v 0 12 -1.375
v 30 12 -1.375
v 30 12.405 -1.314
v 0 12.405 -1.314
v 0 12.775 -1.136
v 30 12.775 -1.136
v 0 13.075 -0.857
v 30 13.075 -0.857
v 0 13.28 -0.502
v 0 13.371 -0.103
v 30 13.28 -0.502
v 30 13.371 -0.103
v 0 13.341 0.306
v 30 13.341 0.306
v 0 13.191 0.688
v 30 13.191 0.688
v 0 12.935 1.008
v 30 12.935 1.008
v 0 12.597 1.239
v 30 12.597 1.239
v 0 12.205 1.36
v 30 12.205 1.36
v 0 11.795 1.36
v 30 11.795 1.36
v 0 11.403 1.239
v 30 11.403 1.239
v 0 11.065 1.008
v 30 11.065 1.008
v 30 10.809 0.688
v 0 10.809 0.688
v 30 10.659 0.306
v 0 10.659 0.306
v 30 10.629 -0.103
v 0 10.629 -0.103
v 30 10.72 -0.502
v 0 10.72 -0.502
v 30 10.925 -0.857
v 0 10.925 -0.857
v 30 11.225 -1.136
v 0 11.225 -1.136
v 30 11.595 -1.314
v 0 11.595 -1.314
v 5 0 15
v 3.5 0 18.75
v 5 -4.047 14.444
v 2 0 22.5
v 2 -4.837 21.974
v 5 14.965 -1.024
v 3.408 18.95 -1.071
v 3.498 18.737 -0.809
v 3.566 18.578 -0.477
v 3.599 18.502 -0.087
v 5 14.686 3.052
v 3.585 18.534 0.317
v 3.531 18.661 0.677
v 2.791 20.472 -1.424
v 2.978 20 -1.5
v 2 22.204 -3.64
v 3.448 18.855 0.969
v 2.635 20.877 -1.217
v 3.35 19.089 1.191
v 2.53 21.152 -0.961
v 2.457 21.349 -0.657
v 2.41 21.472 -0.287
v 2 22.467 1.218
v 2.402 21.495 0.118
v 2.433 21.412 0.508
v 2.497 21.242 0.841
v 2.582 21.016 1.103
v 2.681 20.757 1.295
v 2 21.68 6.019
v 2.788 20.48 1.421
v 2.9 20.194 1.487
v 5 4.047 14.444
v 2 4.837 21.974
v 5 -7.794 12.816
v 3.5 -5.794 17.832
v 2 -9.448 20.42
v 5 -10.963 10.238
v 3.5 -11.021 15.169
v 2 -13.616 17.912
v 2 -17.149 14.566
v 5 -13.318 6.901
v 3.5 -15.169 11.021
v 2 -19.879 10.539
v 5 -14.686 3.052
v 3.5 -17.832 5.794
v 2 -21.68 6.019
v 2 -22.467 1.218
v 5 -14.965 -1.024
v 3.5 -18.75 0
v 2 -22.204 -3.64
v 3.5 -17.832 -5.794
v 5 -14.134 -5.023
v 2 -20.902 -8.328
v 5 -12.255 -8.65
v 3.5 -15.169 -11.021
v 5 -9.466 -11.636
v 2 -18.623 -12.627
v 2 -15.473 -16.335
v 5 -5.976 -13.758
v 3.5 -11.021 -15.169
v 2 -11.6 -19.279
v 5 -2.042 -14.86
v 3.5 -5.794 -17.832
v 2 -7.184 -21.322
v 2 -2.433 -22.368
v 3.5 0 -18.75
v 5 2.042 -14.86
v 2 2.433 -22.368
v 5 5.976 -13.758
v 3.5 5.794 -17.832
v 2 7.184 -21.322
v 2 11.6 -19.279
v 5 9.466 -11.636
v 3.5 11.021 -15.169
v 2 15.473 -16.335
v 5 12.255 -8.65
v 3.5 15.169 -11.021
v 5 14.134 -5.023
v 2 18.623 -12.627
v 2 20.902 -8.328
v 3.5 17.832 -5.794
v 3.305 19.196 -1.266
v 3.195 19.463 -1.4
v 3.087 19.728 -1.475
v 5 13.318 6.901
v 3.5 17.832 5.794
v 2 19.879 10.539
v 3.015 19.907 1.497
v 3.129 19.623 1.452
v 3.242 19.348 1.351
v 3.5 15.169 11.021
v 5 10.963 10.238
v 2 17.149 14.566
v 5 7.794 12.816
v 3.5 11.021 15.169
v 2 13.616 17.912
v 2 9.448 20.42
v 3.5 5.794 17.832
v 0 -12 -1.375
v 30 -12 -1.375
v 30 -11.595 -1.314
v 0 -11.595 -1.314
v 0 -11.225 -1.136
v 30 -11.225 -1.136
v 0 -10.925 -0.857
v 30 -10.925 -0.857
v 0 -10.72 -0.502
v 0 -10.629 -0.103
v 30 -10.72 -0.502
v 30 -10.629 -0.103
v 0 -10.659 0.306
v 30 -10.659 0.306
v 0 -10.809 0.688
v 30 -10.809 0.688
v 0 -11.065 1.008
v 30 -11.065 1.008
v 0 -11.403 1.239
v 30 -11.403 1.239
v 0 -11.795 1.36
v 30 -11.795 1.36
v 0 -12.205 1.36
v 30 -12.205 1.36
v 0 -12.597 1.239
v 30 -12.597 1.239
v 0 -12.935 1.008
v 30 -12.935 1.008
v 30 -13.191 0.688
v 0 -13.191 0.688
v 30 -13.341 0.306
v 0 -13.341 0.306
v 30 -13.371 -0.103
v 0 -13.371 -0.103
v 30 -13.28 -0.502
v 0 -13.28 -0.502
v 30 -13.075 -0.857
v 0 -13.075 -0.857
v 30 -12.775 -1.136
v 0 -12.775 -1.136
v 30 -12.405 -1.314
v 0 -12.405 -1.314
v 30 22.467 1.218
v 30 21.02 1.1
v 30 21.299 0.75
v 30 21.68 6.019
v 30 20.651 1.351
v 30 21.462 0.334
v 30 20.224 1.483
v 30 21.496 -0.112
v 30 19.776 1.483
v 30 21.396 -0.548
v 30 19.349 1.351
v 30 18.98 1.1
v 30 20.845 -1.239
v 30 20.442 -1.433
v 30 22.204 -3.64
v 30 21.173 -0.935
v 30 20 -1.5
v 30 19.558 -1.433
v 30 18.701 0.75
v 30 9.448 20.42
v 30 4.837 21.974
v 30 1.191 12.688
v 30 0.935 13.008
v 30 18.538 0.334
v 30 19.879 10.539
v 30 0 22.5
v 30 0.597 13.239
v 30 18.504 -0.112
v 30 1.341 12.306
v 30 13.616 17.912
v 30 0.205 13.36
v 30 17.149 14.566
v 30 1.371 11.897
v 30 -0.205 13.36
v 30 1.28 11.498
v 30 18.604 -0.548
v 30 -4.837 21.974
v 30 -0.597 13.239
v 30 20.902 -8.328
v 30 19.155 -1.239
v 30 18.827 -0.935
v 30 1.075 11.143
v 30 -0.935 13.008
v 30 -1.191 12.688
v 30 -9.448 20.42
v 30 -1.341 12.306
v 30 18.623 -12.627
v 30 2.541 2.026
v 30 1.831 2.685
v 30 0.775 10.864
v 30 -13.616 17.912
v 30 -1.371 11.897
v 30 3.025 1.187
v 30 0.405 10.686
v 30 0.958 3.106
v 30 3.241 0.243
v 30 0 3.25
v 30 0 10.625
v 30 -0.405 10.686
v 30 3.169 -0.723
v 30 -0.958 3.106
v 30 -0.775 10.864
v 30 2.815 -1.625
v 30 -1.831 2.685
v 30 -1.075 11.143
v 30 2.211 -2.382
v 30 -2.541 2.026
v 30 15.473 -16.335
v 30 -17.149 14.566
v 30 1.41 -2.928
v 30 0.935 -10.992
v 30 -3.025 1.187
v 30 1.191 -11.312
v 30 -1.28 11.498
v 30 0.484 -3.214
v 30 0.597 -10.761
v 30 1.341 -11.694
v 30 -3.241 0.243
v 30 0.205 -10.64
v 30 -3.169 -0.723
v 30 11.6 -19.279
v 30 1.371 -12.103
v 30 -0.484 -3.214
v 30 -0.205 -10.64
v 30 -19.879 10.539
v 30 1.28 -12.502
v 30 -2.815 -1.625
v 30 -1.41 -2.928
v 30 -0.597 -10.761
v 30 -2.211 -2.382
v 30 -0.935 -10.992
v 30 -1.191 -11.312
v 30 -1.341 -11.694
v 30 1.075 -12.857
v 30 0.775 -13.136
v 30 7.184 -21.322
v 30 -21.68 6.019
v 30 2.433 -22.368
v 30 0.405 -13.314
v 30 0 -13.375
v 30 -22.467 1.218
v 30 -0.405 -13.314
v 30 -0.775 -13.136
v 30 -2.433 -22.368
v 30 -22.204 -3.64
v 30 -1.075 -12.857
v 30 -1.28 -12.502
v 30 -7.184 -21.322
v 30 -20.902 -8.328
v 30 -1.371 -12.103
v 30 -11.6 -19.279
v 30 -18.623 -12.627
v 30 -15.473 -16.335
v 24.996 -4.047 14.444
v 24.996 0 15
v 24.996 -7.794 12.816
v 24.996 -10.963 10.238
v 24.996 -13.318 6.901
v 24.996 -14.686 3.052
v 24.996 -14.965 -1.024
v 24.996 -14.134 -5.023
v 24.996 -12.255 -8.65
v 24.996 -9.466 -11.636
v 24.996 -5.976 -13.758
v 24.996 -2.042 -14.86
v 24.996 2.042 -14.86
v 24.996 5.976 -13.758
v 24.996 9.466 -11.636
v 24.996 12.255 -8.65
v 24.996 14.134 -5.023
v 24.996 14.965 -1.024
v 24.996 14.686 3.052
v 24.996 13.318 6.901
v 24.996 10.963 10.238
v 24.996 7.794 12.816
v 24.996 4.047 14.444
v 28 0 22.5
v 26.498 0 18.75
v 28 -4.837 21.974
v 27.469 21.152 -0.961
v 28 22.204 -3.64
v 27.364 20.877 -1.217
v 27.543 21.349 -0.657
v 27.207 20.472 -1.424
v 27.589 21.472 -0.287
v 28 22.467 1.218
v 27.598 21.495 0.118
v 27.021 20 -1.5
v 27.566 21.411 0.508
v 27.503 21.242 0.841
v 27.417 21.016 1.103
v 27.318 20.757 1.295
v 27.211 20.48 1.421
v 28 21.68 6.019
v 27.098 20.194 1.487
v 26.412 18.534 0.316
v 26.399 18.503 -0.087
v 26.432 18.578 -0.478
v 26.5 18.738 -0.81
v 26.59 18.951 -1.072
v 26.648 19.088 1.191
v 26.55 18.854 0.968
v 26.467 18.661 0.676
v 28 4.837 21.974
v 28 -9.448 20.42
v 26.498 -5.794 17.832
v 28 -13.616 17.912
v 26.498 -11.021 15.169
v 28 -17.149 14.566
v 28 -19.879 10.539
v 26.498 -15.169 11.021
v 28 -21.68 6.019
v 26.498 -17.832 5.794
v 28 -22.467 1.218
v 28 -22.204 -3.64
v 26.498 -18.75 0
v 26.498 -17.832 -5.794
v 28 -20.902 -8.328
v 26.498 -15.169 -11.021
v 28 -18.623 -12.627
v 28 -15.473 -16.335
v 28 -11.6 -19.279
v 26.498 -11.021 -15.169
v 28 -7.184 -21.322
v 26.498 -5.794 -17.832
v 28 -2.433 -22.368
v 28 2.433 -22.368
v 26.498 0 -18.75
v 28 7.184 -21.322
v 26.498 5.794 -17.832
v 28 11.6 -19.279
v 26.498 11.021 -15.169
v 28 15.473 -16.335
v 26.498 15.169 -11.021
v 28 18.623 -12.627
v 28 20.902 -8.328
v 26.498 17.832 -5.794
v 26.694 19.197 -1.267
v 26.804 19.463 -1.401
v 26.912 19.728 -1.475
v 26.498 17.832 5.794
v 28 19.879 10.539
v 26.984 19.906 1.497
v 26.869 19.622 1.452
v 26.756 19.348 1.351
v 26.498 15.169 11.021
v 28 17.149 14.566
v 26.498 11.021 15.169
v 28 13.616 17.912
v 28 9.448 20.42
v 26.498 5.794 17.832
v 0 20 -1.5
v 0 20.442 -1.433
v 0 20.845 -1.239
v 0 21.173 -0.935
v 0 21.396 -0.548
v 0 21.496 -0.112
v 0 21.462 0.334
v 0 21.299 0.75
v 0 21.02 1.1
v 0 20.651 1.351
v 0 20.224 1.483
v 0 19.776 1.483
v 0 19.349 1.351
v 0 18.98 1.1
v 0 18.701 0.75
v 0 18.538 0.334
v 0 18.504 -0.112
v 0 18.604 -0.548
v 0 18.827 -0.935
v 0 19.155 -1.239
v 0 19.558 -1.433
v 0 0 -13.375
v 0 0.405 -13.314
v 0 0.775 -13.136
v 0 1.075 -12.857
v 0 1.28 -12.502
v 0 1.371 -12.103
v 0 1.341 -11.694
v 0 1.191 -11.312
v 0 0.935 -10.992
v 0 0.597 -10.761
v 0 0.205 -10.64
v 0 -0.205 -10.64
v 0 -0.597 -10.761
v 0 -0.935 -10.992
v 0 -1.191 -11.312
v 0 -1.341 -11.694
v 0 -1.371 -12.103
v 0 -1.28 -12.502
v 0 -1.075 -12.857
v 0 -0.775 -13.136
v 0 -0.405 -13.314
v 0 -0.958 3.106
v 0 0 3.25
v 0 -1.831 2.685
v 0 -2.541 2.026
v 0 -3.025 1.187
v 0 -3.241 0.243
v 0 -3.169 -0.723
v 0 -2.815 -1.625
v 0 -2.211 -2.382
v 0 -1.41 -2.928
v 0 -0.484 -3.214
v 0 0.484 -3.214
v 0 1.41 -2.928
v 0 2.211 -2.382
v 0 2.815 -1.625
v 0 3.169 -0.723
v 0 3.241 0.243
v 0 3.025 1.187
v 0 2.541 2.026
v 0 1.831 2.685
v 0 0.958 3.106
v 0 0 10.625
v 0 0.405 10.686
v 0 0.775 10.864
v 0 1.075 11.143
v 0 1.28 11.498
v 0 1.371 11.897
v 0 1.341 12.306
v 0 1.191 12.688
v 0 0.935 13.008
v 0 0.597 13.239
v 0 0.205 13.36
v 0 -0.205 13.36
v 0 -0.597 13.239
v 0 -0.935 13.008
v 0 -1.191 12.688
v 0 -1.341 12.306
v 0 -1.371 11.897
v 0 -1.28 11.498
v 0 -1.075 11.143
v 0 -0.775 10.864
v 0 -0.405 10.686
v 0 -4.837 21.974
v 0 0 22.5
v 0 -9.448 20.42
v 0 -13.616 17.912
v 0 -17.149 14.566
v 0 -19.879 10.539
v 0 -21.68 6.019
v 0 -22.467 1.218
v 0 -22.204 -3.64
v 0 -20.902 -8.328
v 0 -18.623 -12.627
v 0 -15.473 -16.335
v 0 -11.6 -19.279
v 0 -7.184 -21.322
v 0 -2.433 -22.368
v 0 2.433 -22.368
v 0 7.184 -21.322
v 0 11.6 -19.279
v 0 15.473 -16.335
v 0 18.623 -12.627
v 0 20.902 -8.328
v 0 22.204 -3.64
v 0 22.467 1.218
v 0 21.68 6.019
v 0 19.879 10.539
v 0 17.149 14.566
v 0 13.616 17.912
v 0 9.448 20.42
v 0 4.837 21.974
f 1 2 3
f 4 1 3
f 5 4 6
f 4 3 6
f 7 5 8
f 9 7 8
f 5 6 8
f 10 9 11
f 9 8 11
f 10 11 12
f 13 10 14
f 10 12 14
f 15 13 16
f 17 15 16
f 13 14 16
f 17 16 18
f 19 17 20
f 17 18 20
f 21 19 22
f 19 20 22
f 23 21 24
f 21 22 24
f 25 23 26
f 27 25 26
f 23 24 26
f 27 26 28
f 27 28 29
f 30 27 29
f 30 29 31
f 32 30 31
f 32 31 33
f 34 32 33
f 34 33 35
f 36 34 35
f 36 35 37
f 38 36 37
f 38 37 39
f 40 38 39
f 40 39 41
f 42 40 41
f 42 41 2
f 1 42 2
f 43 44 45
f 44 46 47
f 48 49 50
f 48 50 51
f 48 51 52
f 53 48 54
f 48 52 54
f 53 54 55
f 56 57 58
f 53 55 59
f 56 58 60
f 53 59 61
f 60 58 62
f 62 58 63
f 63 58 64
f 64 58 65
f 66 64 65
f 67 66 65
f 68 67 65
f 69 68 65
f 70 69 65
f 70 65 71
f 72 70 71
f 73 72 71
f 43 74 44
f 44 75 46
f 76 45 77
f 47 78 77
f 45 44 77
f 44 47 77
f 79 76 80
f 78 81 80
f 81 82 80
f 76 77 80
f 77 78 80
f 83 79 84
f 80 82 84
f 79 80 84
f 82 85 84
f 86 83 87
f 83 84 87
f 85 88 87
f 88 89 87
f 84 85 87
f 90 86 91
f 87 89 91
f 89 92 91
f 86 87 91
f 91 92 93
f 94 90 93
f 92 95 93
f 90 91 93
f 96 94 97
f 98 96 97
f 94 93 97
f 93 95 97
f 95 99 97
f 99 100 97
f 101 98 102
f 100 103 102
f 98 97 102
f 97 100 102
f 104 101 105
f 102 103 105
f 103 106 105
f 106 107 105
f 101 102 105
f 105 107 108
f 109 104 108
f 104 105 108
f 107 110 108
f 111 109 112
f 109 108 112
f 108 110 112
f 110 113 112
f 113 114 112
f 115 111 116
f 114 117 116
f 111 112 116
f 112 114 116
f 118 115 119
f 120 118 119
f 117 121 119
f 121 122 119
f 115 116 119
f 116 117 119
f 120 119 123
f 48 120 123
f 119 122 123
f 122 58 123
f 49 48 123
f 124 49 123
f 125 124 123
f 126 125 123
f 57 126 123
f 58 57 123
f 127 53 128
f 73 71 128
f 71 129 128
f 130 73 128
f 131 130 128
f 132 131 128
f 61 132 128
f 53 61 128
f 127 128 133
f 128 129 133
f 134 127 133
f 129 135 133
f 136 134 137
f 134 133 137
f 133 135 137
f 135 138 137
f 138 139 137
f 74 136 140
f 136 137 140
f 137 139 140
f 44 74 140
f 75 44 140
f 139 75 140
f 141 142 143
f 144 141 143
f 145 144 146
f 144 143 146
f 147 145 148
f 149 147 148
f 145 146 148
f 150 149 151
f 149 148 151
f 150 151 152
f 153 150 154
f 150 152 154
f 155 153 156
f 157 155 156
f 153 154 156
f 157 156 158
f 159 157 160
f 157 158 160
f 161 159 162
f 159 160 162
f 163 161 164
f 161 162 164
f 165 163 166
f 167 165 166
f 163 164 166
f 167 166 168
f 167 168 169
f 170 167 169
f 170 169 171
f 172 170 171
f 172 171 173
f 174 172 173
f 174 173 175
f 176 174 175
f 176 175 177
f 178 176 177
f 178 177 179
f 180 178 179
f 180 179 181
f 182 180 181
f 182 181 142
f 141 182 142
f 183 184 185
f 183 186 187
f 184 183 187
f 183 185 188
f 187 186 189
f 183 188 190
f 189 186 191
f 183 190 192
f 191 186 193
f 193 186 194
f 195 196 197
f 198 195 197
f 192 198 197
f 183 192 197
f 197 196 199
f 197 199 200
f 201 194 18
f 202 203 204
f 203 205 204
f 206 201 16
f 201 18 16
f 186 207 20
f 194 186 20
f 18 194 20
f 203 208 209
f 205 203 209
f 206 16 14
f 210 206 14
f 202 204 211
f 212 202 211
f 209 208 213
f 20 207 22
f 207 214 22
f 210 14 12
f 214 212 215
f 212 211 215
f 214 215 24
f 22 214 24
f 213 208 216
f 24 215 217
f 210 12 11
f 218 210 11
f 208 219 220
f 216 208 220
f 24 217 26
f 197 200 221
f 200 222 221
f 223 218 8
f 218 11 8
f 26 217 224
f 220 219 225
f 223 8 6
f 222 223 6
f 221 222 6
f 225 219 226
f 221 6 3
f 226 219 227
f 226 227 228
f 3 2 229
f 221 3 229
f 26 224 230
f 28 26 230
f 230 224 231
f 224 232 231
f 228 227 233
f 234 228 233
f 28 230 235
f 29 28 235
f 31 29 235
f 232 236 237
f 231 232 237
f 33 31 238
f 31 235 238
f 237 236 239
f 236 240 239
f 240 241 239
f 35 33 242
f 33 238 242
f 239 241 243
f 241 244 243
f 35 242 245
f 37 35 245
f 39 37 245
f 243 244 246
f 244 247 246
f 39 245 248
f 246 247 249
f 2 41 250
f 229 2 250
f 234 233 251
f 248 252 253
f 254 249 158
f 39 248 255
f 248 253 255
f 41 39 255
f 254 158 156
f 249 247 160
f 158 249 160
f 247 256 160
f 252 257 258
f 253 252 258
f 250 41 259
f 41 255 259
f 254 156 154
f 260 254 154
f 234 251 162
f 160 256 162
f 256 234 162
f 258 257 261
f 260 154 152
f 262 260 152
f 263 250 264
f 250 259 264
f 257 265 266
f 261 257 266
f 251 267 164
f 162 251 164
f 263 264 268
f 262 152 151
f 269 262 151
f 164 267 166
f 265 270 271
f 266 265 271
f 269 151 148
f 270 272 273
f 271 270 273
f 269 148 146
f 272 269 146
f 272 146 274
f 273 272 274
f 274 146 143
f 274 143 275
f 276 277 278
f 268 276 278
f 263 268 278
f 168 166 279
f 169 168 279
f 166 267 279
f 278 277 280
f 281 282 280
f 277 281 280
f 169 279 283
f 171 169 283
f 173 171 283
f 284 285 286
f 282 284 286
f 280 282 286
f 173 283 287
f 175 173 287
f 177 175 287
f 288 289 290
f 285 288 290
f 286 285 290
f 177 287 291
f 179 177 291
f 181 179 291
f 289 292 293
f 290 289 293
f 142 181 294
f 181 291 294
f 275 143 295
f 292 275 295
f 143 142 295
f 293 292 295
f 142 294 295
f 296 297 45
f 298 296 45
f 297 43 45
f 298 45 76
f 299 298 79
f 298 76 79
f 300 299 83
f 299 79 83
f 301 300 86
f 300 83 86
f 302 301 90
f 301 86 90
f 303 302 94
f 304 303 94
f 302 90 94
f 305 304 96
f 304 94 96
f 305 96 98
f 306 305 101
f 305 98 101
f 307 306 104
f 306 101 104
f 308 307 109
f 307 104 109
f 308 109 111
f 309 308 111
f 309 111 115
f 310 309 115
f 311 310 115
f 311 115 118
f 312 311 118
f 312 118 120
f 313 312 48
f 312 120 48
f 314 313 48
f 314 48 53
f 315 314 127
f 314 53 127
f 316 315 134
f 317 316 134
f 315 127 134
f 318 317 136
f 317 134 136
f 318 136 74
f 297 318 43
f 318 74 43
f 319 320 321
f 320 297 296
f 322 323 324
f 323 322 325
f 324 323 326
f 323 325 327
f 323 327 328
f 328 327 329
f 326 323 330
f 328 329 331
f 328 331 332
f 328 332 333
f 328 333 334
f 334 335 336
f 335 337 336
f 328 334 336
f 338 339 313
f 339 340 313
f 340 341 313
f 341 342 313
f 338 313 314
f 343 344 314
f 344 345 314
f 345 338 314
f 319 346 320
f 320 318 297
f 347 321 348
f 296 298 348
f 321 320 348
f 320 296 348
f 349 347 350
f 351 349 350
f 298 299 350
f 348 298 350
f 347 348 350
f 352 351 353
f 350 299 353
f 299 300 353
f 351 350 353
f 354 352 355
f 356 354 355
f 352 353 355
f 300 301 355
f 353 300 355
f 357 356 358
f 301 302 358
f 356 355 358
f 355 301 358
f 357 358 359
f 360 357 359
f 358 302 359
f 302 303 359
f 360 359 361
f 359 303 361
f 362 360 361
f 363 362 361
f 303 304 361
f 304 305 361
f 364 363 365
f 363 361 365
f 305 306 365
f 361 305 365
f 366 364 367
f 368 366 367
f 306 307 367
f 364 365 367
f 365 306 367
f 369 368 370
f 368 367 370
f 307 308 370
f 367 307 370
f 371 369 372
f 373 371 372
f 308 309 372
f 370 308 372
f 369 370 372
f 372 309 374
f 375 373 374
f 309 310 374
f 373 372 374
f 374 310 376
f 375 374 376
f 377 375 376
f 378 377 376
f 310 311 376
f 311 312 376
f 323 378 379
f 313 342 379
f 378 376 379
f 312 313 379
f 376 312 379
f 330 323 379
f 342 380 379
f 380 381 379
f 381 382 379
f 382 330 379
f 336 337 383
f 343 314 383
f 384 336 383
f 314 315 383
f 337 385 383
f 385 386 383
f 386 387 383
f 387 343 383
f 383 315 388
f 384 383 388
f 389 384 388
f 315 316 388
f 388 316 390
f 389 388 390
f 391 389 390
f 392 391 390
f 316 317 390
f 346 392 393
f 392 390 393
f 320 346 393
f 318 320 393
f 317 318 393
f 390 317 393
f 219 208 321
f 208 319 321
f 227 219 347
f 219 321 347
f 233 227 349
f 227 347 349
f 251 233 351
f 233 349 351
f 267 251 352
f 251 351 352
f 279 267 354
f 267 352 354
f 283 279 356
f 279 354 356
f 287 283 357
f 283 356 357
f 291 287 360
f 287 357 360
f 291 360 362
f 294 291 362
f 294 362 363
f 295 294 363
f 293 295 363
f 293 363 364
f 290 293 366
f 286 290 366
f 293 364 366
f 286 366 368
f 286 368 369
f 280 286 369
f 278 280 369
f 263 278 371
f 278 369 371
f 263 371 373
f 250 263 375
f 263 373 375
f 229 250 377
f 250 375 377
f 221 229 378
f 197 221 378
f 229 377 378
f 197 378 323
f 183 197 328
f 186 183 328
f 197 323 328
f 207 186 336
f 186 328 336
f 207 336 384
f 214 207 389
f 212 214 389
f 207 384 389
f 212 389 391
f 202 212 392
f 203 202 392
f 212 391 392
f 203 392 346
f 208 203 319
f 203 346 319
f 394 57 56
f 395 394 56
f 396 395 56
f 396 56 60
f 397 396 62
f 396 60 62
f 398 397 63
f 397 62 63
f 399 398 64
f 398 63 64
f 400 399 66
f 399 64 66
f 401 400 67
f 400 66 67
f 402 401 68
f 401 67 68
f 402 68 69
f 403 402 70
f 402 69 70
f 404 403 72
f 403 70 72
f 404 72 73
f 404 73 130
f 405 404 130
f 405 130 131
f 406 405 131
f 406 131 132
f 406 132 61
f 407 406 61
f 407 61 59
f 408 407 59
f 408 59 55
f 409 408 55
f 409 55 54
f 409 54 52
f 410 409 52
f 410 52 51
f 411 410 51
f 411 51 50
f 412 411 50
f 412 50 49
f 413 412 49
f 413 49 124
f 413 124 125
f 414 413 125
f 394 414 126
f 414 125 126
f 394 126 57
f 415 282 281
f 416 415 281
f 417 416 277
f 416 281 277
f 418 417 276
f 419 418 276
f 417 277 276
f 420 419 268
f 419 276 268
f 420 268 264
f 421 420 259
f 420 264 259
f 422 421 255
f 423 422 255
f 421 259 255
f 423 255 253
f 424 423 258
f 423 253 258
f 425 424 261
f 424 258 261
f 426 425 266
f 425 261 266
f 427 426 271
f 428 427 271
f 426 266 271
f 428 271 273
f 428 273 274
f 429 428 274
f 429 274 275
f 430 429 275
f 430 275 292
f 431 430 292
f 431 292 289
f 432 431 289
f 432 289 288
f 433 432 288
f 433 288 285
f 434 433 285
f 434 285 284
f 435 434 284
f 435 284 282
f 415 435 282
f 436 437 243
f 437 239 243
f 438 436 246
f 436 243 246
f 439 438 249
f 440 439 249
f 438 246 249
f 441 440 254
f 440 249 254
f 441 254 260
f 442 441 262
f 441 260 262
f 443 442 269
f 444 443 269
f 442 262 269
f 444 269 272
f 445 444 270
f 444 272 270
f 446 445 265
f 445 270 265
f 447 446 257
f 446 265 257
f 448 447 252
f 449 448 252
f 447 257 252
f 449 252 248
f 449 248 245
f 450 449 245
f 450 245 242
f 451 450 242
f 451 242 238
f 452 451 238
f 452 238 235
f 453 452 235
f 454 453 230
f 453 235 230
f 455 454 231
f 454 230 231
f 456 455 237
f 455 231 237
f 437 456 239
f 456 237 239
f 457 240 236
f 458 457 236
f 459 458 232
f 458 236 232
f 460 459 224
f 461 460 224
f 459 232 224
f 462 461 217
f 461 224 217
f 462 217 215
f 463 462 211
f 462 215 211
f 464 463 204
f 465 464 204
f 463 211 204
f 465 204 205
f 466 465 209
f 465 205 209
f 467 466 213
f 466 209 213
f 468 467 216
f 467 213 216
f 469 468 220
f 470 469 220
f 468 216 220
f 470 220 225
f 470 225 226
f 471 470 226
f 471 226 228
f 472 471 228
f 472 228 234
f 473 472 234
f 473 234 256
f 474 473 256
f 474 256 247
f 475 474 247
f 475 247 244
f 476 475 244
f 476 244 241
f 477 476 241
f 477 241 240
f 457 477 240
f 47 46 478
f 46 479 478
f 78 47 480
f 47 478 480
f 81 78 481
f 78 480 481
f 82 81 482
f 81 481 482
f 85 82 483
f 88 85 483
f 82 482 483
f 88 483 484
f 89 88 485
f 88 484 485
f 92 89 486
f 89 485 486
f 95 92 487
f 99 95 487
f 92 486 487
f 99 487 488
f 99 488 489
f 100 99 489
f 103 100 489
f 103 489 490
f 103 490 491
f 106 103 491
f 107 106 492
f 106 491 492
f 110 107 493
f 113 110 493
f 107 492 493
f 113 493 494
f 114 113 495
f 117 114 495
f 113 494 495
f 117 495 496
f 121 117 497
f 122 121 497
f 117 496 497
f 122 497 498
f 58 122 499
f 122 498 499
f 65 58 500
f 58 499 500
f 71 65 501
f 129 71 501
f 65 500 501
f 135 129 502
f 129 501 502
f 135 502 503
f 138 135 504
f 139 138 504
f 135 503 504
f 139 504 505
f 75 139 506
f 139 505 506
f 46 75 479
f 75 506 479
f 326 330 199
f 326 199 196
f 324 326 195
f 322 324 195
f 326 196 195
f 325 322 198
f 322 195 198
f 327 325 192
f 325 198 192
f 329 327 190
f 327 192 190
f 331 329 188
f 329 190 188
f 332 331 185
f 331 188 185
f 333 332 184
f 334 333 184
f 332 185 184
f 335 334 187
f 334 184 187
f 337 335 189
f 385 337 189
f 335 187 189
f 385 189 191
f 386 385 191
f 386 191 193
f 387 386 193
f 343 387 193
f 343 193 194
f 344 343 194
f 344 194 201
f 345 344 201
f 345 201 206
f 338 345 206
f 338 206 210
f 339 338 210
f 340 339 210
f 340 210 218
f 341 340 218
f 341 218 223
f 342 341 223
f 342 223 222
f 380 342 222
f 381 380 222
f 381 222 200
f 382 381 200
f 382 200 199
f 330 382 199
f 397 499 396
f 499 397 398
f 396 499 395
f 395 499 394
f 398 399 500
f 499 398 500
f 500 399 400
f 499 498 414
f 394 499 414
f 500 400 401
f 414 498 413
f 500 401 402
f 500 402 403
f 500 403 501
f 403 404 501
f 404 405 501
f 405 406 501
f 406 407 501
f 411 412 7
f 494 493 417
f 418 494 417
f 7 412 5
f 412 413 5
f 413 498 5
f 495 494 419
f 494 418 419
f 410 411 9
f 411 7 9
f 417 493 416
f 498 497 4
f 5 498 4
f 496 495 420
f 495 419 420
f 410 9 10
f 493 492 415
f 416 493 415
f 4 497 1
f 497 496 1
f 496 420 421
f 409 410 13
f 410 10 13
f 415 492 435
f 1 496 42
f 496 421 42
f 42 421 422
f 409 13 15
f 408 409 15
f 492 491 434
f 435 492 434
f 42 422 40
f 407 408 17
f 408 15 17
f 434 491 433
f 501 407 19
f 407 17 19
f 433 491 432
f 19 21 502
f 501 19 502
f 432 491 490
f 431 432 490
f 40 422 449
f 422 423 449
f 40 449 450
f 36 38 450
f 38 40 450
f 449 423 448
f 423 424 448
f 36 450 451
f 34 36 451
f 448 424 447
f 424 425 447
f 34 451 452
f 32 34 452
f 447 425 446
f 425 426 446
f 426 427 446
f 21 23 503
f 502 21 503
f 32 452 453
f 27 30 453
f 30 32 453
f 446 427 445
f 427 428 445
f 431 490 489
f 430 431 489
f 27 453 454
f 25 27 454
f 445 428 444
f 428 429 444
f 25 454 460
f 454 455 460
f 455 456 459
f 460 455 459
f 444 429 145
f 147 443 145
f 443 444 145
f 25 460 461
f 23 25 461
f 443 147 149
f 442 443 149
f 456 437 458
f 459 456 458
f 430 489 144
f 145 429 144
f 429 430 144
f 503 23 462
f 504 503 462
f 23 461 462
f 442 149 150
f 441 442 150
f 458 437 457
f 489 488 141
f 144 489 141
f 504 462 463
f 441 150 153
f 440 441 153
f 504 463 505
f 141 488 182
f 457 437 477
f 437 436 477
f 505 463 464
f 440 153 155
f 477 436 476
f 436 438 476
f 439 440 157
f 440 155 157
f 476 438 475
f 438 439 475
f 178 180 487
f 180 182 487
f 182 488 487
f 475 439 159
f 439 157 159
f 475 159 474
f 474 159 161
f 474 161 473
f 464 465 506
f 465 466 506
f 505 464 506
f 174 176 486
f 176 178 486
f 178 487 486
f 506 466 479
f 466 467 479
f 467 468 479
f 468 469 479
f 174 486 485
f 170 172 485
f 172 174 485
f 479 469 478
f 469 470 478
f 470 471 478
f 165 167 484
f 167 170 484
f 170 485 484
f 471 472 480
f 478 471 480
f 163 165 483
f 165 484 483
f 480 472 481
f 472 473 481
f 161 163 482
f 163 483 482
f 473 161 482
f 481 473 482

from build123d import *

# Parameters (mm, degrees)
SKETCH2_R          = 1.375
SKETCH2_R_2        = 1.5
CUT_EXTRUDE1_DEPTH = 44.732139211


with BuildPart() as part:
    # Sketch1 → Revolve1 (revolve)
    with BuildSketch(Plane(origin=(0, 0, 0), x_dir=(1, 0, 0), z_dir=(0, 1, 0)), mode=Mode.PRIVATE) as revolve1_sk:
        Polygon((5, 15), (2, 22.5), (0, 22.5), (0, 3.25), (30, 3.25), (30, 22.5), (28, 22.5), (24.995890376, 15), align=None)
    revolve(revolve1_sk.sketch.rotate(Axis((0, 0, 0), (1, 0, 0)), 180), axis=Axis((0, 0, 0), (1, 0, 0)))

    # Sketch2 → Cut-Extrude1 (cut, through all)
    with BuildSketch(Plane(origin=(30, 0, 0), x_dir=(0, 0, -1), z_dir=(1, 0, 0))):
        with Locations((0, 12)):
            Circle(SKETCH2_R)
        with Locations((0, 20)):
            Circle(SKETCH2_R_2)
        with Locations((12, 0)):
            Circle(SKETCH2_R)
        with Locations((0, -12)):
            Circle(SKETCH2_R)
        with Locations((-12, 0)):
            Circle(SKETCH2_R)
    extrude(amount=-CUT_EXTRUDE1_DEPTH, mode=Mode.SUBTRACT)


solid = part.part
